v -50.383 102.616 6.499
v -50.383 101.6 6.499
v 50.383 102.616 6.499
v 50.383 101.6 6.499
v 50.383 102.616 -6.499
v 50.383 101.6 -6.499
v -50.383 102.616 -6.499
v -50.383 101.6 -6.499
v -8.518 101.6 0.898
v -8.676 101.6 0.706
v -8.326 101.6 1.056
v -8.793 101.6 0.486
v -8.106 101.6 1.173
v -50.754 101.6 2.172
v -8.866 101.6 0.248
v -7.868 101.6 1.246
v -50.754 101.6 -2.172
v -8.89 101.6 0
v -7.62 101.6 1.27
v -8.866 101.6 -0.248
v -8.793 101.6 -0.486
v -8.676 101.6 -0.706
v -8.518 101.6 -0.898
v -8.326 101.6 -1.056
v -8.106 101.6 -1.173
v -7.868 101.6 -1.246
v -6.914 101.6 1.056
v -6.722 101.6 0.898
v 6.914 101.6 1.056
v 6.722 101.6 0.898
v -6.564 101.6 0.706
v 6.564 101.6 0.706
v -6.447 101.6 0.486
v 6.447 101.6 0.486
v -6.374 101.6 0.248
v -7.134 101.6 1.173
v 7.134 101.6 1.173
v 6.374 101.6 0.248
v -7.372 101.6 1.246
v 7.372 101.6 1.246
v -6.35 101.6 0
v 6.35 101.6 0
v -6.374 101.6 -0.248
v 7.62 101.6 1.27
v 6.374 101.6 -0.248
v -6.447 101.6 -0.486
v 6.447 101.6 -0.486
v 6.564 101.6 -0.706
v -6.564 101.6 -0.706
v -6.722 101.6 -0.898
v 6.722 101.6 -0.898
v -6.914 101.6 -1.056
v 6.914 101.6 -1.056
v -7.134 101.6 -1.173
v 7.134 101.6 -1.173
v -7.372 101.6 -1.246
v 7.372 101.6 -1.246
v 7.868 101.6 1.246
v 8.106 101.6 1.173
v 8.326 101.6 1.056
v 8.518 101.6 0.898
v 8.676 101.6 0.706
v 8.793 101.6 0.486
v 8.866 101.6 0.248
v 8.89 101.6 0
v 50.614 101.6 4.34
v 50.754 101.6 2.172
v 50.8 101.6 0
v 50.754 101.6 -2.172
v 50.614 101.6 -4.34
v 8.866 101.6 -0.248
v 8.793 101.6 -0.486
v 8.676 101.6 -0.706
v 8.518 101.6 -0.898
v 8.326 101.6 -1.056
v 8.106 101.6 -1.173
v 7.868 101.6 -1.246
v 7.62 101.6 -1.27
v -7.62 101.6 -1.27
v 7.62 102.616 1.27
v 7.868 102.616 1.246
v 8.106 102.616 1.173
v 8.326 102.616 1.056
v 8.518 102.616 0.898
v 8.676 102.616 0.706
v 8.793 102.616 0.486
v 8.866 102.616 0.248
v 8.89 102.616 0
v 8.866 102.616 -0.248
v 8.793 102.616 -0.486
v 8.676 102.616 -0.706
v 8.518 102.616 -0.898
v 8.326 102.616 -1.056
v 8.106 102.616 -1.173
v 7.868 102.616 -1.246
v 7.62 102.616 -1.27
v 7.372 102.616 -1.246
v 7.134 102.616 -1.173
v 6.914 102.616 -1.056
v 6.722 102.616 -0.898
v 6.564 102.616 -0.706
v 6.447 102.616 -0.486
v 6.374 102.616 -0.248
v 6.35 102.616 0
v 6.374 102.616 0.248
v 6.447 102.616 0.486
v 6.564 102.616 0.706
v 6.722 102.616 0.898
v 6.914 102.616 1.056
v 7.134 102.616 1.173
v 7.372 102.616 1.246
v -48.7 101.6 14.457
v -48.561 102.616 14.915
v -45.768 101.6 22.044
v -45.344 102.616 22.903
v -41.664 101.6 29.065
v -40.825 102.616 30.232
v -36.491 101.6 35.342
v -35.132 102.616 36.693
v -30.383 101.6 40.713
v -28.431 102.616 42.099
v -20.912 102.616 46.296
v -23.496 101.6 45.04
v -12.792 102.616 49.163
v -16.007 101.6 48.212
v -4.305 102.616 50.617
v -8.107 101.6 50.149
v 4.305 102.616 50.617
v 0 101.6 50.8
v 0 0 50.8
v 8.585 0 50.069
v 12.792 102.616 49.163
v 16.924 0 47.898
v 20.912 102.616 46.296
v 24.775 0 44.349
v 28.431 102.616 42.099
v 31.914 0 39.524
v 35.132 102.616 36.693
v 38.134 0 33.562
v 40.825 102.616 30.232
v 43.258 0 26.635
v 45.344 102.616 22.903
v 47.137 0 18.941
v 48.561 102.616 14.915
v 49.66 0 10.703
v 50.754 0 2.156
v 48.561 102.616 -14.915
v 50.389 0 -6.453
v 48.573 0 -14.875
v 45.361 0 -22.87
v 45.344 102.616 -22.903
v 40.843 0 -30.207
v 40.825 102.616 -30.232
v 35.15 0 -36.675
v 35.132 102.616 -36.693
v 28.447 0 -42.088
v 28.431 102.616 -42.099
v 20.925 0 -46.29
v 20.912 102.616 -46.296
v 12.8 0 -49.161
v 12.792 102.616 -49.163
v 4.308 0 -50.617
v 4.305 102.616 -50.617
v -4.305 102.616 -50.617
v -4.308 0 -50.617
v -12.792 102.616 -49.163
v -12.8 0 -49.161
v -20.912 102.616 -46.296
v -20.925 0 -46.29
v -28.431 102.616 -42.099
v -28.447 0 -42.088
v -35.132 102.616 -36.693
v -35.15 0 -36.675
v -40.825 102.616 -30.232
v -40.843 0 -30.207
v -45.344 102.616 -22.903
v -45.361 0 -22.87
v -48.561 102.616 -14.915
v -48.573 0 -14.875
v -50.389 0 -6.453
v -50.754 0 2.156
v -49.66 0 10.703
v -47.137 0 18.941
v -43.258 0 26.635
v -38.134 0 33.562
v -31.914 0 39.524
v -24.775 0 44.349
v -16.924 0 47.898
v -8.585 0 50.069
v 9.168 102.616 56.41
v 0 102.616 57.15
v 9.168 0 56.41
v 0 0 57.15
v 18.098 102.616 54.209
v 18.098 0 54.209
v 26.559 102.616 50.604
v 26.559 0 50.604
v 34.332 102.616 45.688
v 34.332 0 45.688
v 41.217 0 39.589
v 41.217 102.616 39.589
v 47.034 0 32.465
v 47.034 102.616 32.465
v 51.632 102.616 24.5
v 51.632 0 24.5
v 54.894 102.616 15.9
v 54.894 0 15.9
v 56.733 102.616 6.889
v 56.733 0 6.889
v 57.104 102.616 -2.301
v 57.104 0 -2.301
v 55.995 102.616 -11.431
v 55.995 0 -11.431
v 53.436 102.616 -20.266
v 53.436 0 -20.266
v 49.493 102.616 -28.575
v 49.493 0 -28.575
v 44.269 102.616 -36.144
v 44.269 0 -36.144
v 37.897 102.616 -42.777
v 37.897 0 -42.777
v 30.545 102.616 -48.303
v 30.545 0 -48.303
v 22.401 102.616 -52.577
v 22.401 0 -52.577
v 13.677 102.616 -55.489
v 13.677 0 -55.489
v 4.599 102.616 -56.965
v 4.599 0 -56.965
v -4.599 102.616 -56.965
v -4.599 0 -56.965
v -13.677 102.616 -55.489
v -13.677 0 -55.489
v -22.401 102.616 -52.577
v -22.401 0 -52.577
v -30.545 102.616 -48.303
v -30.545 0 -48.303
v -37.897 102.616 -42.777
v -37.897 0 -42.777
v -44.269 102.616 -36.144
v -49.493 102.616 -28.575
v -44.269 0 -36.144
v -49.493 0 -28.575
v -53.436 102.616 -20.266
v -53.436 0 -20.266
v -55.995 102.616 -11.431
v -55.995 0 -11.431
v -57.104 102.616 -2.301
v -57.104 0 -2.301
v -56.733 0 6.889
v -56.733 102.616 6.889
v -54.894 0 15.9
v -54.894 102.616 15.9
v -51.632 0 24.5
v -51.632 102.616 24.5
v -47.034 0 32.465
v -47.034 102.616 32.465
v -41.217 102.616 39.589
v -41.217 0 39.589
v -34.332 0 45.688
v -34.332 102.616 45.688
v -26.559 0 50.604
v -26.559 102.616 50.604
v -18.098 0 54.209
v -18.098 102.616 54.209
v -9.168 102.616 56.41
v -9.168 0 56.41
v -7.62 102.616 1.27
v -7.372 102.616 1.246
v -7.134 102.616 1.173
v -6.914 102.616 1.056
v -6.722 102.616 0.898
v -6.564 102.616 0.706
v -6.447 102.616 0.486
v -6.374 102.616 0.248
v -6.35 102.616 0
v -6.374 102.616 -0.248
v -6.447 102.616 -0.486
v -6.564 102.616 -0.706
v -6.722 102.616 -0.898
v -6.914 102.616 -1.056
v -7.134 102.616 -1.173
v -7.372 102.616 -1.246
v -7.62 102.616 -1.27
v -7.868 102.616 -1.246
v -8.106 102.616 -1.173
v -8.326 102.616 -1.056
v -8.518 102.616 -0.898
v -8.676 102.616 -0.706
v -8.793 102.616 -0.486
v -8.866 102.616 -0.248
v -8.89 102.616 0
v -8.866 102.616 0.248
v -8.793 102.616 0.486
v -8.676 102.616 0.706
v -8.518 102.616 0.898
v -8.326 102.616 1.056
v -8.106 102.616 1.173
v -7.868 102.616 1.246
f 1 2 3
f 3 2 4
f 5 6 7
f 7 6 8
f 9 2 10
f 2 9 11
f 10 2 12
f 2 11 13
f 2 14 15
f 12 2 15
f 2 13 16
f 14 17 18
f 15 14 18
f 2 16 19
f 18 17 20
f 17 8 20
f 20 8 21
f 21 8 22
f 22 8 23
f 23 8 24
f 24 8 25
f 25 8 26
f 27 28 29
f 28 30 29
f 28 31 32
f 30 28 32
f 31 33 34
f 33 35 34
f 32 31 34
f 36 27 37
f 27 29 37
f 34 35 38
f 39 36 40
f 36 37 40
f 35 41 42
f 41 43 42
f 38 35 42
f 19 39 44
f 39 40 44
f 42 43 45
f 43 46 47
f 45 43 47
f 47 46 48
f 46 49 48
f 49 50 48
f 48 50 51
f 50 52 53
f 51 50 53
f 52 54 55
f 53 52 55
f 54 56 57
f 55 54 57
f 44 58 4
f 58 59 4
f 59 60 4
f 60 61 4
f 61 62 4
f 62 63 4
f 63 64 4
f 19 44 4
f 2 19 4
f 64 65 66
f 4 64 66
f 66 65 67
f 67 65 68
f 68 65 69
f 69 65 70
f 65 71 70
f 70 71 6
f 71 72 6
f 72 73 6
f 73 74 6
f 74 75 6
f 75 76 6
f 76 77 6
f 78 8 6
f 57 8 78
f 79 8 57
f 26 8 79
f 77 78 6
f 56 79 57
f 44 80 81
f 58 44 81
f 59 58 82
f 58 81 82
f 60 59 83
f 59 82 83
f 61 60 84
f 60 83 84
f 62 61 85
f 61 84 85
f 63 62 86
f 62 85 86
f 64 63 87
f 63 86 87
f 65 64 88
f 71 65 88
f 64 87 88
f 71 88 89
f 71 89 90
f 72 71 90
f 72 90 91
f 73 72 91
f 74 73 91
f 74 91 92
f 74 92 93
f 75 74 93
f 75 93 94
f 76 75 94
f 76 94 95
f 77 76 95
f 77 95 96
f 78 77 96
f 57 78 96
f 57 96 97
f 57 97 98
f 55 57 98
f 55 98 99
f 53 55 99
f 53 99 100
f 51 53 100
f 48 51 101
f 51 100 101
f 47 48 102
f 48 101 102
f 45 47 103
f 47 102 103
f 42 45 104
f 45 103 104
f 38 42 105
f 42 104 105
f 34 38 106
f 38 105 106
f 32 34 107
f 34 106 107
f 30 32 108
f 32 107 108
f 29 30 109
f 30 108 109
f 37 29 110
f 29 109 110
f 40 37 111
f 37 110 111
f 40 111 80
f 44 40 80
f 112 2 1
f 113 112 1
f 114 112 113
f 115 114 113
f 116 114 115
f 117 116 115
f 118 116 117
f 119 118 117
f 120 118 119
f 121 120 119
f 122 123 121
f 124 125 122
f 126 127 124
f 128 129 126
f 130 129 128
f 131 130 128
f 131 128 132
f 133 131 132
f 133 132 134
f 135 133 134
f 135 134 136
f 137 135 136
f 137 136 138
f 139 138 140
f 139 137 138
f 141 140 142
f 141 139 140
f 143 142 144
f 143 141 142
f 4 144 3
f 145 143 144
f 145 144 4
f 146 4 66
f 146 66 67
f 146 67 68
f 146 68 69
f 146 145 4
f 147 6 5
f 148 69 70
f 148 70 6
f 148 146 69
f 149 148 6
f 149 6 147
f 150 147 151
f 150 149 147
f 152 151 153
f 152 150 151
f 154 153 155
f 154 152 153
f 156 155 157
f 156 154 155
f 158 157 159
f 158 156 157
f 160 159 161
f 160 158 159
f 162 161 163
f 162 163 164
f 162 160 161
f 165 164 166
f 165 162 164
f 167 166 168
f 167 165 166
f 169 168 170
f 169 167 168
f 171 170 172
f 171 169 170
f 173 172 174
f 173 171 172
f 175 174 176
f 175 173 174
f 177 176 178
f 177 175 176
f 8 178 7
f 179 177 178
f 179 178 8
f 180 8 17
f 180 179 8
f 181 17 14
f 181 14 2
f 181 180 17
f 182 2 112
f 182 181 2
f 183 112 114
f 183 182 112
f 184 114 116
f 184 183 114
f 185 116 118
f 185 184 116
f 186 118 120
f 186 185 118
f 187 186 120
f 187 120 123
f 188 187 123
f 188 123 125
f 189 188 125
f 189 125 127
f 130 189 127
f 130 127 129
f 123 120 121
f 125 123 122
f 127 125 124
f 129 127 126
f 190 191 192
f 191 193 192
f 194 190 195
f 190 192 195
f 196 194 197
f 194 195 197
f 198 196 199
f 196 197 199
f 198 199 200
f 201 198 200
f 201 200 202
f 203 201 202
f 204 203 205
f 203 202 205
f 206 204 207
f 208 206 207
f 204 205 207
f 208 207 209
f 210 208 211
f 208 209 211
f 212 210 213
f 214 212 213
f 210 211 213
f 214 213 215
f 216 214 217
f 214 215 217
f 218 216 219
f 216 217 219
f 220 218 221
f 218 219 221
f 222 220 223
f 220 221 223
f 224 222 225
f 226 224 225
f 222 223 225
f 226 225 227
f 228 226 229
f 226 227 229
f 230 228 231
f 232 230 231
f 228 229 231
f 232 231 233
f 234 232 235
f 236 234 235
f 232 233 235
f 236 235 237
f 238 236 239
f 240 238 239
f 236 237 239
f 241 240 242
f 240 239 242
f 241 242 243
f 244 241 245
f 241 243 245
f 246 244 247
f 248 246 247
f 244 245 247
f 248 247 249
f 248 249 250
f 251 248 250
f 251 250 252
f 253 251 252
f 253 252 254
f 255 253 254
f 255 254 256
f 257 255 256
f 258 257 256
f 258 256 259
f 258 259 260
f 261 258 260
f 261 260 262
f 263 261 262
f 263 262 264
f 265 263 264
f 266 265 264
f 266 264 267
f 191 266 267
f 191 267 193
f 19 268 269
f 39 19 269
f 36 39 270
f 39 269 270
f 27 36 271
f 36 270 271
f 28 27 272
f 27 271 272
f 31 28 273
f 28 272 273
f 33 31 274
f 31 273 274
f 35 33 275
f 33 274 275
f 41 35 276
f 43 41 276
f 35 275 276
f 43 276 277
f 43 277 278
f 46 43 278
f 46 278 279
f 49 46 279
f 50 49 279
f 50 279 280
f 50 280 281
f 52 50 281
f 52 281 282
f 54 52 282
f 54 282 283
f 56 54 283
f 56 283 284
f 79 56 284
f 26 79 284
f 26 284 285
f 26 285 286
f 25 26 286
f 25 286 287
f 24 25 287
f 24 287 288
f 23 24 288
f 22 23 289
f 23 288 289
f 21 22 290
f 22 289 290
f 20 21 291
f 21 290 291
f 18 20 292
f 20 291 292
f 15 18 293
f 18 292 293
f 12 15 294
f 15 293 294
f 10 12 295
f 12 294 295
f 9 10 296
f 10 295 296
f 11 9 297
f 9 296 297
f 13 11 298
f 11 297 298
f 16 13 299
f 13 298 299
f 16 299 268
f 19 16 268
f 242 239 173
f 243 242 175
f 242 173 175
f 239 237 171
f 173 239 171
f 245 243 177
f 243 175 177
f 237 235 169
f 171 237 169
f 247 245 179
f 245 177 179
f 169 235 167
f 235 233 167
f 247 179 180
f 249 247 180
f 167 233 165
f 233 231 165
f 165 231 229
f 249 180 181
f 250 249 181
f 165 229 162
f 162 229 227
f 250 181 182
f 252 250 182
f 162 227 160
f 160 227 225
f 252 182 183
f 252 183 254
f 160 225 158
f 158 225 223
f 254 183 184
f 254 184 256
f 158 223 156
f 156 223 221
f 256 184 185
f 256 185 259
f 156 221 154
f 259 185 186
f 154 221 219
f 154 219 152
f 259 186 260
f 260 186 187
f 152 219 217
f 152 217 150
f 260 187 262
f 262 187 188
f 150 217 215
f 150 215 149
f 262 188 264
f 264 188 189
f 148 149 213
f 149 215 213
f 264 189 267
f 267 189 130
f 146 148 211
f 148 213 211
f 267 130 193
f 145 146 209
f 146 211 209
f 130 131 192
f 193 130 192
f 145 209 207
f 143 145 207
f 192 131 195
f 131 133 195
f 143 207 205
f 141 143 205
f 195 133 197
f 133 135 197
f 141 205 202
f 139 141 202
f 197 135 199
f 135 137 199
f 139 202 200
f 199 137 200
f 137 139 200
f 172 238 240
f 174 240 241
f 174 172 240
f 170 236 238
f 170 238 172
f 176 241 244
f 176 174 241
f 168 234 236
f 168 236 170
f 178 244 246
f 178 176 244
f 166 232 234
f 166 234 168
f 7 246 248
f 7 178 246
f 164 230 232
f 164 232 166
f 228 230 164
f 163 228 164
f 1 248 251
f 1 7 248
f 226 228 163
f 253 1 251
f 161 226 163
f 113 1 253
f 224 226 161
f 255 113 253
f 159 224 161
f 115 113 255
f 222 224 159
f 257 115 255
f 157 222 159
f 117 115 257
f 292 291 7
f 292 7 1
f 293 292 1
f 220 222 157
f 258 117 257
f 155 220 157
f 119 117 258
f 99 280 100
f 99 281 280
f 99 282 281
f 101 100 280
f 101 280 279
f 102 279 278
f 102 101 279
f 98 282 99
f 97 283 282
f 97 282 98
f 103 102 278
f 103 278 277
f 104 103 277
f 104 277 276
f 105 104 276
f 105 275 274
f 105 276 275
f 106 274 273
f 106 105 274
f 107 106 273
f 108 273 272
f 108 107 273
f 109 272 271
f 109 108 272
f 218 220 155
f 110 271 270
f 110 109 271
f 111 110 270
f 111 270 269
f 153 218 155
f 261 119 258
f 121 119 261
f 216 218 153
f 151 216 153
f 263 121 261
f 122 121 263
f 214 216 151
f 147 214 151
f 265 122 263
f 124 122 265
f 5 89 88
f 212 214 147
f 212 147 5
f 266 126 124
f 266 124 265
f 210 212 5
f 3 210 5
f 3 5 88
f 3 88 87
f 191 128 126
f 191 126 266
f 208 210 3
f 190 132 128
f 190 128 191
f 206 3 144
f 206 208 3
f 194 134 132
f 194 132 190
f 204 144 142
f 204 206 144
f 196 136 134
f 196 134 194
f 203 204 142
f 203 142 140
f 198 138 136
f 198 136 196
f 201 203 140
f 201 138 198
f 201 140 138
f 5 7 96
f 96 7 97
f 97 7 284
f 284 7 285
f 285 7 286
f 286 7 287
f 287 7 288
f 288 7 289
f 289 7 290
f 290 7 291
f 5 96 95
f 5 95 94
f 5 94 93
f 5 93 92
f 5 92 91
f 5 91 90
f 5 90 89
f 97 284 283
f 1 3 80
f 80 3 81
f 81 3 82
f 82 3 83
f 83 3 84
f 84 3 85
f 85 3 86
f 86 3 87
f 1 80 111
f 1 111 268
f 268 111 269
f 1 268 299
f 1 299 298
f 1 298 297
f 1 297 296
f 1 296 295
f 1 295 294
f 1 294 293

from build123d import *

# Parameters (mm, degrees)
SKETCH2_R           = 57.15
SKETCH2_R_2         = 50.8
BOSS_EXTRUDE1_DEPTH = 101.6
SKETCH4_R           = 57.15
SKETCH4_R_2         = 50.8
BOSS_EXTRUDE2_DEPTH = 1.016
SKETCH5_R           = 1.27
CUT_EXTRUDE2_DEPTH  = 14.732


with BuildPart() as part:
    # Sketch2 → Boss-Extrude1 (new body)
    with BuildSketch(Plane(origin=(0, 0, 0), x_dir=(1, 0, 0), z_dir=(0, 1, 0))):
        with Locations(Location((0, 0, 0), (0, 0, 270))):
            Circle(SKETCH2_R)
        with Locations(Location((0, 0, 0), (0, 0, 270))):
            Circle(SKETCH2_R_2, mode=Mode.SUBTRACT)
    extrude(amount=BOSS_EXTRUDE1_DEPTH)

    # Sketch4 → Boss-Extrude2 (add)
    # profile 1 of 2: a face of its own
    with BuildSketch(Plane(origin=(0, 101.6, 0), x_dir=(1, 0, 0), z_dir=(0, 1, 0))):
        with Locations(Location((0, 0, 0), (0, 0, 270))):
            Circle(SKETCH4_R)
        with Locations(Location((0, 0, 0), (0, 0, 172.649423361))):
            Circle(SKETCH4_R_2, mode=Mode.SUBTRACT)
    # profile 2 of 2: a face of its own
    with BuildSketch(Plane(origin=(0, 101.6, 0), x_dir=(1, 0, 0), z_dir=(0, 1, 0))):
        with BuildLine():
            Line((-50.382520142, -6.499358748), (0, -6.499358748))
            Line((0, -6.499358748), (50.382520142, -6.499358748))
            ThreePointArc((50.382520142, -6.499358748), (50.695522599, -3.256376574), (50.8, 0))
            ThreePointArc((50.8, 0), (50.695522599, 3.256376574), (50.382520142, 6.499358748))
            Line((50.382520142, 6.499358748), (-50.382520142, 6.499358748))
            ThreePointArc((-50.382520142, 6.499358748), (-50.8, 0), (-50.382520142, -6.499358748))
        make_face()
    extrude(amount=BOSS_EXTRUDE2_DEPTH)

    # Sketch5 → Cut-Extrude2 (cut)
    with BuildSketch(Plane(origin=(0, 102.616, 0), x_dir=(1, 0, 0), z_dir=(0, 1, 0))):
        with Locations(Location((7.62, 0, 0), (0, 0, 270))):
            Circle(SKETCH5_R)
        with Locations(Location((-7.62, 0, 0), (0, 0, 270))):
            Circle(SKETCH5_R)
    extrude(amount=-CUT_EXTRUDE2_DEPTH, mode=Mode.SUBTRACT)


solid = part.part
